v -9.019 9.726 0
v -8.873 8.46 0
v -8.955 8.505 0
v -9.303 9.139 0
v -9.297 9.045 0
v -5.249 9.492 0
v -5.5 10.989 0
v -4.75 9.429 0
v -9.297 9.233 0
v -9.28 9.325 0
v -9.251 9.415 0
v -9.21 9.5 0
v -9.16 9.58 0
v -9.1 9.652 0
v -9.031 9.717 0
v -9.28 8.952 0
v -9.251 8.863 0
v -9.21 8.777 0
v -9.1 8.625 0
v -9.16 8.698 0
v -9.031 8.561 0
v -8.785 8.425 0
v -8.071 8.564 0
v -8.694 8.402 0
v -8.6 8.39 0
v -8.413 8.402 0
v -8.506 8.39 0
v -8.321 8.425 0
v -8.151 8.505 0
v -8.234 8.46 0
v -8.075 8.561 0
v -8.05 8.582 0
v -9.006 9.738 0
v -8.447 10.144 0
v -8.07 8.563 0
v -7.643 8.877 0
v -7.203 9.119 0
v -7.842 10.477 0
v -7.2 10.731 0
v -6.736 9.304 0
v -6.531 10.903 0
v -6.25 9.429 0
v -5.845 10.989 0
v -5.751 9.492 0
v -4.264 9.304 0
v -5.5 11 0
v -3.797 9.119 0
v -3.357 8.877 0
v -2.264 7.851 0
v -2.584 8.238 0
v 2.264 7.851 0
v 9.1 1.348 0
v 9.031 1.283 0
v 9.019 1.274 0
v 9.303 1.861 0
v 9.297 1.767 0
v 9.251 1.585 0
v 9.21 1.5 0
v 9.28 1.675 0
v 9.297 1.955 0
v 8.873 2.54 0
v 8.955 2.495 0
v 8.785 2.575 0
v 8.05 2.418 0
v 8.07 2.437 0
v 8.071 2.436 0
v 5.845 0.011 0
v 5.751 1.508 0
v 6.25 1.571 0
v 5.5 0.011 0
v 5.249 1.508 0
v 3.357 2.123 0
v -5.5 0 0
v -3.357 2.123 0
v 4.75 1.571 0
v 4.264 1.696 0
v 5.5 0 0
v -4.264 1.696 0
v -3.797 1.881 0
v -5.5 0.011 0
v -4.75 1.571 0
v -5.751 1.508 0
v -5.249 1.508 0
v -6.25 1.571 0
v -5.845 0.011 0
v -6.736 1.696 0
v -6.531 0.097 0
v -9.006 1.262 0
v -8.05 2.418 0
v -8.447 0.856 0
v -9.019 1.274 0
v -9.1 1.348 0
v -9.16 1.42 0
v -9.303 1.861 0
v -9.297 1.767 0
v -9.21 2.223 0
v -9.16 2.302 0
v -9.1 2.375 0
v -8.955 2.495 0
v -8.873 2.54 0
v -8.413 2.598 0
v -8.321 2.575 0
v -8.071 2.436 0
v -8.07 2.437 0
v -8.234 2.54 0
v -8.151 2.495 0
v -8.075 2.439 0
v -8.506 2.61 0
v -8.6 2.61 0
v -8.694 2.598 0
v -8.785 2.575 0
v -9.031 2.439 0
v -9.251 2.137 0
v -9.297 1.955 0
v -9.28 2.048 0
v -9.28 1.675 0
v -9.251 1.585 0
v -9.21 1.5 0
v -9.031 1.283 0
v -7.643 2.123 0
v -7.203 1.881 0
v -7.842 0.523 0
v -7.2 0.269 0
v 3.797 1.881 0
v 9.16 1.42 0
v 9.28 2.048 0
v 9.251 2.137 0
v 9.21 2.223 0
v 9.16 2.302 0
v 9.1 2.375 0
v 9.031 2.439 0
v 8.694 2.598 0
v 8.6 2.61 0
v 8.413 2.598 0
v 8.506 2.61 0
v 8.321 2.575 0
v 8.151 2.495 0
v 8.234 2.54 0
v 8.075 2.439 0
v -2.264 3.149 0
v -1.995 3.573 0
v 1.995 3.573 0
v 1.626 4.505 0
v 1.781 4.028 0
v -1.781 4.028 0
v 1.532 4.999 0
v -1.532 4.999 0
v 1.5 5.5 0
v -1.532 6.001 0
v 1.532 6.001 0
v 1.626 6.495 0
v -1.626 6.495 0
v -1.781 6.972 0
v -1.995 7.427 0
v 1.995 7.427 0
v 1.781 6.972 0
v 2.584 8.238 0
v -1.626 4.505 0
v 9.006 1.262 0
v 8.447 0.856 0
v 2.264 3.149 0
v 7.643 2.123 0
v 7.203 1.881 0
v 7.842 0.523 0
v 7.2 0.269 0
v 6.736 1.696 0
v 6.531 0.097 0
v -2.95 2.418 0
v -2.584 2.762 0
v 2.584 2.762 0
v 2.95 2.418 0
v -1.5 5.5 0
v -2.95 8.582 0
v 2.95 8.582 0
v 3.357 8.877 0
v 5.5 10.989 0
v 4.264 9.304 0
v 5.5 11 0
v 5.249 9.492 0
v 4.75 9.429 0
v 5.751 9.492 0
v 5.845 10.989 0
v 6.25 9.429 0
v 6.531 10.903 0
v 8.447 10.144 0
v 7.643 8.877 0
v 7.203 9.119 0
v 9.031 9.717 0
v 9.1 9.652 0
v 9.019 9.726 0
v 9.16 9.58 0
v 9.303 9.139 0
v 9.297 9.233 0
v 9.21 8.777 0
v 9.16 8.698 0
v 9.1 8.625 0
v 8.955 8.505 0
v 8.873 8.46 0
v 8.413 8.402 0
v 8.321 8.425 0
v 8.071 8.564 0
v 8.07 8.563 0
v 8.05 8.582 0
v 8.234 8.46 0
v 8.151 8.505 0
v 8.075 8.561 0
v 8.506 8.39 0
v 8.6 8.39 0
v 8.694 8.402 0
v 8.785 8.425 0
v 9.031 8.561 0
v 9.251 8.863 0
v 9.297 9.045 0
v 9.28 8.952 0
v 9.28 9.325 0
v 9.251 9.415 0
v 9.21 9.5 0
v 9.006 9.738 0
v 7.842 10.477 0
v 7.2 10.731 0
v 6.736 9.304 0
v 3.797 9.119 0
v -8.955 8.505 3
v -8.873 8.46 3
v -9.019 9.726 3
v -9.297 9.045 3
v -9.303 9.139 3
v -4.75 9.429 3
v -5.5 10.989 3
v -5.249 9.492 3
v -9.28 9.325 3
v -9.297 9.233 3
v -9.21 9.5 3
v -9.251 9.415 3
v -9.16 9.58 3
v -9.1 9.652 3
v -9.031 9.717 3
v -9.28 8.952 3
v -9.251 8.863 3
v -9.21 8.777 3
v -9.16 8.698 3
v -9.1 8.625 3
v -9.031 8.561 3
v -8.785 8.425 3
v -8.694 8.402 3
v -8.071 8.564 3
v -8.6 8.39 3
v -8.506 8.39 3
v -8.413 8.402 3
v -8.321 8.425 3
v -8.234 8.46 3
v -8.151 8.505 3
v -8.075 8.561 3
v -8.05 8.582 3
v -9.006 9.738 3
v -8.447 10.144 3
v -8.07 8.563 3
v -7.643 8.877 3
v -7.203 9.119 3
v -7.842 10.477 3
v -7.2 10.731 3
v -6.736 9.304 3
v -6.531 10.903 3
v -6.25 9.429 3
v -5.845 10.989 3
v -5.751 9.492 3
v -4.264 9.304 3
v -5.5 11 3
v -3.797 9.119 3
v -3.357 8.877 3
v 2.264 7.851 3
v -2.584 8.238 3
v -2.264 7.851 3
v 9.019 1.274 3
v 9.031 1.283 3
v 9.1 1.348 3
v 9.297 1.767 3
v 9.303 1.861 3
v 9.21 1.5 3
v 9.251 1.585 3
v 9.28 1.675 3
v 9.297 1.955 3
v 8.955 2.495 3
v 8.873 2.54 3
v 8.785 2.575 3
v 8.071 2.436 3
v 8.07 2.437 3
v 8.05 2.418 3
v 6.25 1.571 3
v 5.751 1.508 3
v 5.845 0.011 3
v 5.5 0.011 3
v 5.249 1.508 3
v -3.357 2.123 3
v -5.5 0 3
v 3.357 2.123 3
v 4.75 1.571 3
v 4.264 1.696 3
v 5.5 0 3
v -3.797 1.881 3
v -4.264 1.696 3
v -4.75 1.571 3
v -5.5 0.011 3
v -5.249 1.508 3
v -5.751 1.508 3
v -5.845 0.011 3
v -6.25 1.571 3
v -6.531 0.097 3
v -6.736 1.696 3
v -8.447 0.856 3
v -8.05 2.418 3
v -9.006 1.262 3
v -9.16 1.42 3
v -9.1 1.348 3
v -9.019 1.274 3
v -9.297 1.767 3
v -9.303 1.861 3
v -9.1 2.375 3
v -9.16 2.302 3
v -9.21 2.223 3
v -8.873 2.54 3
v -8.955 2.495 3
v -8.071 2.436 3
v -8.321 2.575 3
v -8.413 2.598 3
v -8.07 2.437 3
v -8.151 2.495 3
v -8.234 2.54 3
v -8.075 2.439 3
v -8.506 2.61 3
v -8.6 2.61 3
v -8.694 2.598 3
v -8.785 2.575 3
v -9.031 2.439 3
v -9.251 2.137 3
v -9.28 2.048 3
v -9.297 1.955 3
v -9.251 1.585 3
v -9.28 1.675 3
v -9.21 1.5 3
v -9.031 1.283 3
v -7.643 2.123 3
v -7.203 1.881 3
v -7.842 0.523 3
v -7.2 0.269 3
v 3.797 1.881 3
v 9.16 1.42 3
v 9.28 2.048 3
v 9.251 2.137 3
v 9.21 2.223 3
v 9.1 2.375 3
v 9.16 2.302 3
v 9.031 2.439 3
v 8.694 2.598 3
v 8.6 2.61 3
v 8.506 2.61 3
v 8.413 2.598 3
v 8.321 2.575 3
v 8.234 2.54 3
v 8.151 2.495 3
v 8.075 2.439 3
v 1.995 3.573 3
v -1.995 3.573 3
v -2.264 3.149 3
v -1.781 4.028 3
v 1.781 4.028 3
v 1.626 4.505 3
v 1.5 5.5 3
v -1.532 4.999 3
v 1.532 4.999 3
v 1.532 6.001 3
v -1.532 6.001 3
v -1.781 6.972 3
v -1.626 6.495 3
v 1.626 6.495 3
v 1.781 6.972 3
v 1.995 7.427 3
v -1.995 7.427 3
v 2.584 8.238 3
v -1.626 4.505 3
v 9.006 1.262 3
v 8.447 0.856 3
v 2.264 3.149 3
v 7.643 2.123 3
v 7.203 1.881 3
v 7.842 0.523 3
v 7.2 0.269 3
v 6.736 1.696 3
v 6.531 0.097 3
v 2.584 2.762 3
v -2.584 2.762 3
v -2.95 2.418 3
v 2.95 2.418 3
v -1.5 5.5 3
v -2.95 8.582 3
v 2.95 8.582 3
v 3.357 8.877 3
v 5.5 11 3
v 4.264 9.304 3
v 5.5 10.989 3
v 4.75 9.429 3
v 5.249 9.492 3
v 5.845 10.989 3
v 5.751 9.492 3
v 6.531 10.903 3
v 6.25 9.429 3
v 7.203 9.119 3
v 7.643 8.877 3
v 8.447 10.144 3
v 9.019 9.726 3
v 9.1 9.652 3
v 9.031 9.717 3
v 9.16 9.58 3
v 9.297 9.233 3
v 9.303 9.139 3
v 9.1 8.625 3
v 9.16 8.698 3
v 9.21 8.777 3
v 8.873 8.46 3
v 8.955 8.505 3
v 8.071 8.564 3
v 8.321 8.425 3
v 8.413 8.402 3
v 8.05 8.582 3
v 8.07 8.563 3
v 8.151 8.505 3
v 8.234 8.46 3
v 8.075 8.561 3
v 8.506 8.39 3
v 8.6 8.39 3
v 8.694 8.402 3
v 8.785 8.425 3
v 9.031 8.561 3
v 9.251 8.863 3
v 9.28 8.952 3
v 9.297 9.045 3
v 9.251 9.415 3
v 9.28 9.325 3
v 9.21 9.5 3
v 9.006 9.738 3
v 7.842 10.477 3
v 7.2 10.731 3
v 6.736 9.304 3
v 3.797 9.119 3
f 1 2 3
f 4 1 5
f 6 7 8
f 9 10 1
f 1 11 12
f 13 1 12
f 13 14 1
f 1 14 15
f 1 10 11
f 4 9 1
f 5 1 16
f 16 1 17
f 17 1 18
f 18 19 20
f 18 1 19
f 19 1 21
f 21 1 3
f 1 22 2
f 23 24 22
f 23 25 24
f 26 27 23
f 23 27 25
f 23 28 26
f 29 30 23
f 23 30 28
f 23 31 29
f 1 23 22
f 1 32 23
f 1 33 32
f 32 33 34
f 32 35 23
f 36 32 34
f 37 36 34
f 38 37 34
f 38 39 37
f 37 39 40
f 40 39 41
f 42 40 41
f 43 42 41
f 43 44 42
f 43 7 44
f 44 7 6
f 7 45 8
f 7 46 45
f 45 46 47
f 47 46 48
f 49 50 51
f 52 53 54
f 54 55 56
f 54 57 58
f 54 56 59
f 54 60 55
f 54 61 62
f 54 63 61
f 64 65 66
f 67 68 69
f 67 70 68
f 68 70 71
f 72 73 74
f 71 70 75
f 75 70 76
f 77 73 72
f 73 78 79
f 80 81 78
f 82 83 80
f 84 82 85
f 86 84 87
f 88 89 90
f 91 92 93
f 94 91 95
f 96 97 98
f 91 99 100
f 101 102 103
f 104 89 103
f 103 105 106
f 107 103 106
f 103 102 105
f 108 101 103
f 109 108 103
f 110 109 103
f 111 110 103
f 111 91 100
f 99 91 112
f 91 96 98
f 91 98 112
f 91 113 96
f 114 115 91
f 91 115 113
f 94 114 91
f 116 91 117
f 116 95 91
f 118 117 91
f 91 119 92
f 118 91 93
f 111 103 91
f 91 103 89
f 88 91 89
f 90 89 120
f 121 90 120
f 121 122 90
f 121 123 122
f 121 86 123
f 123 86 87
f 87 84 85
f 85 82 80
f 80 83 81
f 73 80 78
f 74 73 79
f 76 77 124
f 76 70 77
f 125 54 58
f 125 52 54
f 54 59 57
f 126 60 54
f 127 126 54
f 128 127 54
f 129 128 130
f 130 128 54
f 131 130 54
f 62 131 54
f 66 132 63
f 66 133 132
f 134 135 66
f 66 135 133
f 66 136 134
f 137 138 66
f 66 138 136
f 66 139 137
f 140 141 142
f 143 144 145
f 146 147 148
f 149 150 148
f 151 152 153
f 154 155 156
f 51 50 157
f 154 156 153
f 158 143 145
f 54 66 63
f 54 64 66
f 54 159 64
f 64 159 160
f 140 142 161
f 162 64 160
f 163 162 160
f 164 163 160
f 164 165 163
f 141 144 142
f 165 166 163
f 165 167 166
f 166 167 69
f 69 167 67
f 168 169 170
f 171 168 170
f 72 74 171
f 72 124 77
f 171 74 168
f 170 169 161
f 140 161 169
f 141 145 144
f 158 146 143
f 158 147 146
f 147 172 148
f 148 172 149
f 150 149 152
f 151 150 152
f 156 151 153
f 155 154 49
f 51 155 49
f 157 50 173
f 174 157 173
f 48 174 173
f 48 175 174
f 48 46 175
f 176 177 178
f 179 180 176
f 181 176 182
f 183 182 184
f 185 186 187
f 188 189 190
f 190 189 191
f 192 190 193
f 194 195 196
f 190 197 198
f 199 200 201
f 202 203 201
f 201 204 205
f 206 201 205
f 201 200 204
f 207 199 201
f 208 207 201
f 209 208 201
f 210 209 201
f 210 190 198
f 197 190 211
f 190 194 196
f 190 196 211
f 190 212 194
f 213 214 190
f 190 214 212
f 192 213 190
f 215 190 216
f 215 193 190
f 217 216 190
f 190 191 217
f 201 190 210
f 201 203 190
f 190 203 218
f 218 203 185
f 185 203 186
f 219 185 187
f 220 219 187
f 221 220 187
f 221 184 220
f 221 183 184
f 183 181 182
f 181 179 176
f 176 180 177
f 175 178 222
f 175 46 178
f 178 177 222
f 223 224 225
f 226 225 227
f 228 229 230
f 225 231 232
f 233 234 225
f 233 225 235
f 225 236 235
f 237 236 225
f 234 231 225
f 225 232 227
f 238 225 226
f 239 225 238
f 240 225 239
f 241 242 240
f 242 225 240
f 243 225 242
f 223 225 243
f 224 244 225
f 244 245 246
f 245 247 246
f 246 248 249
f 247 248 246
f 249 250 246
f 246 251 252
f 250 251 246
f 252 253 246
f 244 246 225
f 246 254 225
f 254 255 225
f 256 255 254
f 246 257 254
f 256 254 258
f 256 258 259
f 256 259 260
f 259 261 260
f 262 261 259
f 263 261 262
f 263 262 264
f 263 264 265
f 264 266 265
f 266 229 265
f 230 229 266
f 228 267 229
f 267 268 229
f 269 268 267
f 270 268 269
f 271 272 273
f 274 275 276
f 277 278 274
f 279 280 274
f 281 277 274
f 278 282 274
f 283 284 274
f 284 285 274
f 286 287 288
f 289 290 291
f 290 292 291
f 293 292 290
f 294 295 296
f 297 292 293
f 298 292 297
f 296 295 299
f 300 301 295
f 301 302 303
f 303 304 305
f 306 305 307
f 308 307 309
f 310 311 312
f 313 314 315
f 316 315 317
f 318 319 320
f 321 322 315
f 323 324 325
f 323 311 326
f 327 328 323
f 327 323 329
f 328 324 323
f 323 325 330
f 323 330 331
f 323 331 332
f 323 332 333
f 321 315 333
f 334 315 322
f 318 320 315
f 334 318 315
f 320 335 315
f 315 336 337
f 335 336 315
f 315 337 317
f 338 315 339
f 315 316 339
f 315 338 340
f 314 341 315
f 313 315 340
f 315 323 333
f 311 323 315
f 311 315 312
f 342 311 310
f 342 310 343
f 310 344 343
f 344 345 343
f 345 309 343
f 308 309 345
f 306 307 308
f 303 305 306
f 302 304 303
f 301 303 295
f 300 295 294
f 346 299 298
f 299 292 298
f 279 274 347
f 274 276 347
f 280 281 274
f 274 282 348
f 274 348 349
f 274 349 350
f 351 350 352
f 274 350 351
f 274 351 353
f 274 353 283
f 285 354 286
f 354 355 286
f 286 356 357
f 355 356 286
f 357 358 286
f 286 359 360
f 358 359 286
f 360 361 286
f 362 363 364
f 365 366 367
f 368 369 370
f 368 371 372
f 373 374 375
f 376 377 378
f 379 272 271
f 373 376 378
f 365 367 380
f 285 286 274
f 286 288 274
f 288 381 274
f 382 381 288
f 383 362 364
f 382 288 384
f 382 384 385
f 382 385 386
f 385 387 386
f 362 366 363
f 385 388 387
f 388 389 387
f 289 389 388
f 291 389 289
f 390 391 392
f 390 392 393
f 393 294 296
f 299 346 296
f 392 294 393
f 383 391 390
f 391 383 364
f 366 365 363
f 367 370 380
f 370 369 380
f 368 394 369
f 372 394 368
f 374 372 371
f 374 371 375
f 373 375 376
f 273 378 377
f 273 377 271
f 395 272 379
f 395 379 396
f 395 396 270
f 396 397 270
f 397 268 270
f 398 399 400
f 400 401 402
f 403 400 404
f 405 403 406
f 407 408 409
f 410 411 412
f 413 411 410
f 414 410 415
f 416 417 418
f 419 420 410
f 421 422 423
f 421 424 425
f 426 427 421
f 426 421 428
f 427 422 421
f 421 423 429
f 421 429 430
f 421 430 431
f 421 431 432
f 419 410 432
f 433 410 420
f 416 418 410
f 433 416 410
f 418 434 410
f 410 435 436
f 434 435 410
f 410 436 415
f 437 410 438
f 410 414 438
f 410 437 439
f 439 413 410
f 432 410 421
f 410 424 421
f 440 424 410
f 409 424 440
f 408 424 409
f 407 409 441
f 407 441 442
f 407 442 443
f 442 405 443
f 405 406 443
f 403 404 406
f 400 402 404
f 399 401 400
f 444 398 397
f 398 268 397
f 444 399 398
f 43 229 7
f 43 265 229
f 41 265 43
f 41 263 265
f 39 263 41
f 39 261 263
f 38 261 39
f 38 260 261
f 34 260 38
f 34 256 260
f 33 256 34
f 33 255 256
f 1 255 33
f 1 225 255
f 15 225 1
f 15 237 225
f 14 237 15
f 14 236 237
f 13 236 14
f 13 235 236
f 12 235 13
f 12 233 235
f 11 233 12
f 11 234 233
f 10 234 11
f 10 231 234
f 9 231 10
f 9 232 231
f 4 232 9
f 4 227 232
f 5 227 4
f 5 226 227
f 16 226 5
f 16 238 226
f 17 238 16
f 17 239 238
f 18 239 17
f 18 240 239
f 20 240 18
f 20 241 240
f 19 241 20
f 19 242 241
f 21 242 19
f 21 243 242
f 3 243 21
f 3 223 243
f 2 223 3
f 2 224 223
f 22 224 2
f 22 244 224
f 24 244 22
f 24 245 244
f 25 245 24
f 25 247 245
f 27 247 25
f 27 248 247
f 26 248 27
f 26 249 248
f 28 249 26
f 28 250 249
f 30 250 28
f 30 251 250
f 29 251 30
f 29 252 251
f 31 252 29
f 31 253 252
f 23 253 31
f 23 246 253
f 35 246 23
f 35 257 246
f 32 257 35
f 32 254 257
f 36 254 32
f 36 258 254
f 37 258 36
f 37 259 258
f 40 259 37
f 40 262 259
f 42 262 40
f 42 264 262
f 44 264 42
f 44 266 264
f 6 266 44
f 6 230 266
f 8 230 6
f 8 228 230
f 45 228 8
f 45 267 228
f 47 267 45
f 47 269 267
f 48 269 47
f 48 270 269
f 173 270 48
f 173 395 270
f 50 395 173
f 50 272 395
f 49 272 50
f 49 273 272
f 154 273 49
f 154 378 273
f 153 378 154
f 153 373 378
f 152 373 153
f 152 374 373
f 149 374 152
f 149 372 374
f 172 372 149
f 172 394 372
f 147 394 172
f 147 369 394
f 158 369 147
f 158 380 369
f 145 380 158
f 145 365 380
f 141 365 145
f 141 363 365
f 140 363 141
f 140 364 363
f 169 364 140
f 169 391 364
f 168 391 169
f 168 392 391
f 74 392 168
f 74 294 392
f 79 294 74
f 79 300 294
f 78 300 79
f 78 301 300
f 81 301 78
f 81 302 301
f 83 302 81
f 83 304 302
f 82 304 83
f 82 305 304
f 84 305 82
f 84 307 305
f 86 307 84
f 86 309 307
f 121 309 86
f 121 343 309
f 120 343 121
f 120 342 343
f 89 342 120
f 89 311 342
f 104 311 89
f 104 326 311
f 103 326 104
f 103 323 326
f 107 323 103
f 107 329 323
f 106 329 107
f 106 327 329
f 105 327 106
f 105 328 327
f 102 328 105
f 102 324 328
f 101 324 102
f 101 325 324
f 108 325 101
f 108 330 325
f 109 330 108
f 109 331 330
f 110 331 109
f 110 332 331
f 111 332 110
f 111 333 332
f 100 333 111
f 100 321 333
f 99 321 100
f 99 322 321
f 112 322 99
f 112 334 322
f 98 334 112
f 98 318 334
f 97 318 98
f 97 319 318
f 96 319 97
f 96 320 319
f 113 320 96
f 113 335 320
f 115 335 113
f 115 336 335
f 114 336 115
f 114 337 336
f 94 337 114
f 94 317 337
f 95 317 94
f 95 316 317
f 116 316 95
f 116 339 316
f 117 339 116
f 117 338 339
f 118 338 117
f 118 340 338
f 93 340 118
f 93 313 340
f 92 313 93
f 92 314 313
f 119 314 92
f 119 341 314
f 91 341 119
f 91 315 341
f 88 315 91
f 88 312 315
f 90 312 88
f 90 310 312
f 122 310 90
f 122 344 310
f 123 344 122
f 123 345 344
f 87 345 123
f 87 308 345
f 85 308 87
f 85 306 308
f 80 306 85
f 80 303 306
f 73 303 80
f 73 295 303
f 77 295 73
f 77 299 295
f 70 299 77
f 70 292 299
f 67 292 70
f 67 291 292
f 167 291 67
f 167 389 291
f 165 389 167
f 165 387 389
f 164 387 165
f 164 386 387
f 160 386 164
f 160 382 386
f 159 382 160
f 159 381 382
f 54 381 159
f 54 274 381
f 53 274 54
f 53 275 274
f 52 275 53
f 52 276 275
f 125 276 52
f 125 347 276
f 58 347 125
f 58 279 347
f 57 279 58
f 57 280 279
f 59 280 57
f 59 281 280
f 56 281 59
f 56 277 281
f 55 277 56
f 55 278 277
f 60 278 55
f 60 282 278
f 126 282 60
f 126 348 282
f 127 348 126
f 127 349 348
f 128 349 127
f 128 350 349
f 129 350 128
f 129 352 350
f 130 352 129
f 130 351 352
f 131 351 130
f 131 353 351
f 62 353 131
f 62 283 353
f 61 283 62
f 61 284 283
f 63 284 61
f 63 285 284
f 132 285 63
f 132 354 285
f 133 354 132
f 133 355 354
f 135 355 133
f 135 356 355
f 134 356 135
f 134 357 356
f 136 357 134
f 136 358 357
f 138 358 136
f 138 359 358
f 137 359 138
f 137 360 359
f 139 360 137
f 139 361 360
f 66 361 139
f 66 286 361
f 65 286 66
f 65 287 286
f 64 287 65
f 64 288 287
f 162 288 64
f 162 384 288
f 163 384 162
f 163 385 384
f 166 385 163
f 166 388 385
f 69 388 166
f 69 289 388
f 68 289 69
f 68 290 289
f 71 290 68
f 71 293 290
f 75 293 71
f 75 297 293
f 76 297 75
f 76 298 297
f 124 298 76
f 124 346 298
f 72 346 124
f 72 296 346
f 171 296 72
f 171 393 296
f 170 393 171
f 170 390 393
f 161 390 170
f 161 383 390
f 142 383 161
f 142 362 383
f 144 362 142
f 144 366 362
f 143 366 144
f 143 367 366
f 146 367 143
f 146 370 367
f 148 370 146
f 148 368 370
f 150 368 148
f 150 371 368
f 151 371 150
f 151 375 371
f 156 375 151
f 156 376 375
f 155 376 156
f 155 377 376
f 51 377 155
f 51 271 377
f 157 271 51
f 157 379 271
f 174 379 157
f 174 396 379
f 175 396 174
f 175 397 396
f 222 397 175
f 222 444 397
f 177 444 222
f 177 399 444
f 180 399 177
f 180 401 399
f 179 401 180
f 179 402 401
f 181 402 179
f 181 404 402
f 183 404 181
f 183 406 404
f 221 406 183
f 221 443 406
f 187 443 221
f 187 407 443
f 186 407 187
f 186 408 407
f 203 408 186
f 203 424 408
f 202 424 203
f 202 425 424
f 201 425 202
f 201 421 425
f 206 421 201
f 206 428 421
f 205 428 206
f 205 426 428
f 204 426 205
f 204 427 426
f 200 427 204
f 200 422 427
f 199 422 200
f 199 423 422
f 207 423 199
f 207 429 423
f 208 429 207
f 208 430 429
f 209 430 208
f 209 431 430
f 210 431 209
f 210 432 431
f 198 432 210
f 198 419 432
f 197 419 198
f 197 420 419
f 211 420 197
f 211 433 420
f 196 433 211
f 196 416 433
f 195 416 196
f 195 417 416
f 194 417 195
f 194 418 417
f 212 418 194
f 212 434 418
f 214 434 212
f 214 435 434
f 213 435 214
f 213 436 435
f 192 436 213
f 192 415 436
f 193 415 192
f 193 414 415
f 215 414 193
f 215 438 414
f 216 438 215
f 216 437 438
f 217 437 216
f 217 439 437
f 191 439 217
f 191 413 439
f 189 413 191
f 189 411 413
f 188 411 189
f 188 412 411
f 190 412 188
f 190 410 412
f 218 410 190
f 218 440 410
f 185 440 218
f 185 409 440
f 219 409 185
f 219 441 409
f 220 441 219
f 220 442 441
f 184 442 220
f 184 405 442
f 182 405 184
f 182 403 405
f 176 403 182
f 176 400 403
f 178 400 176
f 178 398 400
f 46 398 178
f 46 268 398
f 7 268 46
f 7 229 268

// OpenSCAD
// Copyright (c) 2016 Kenneth Johansson <ken@kenjo.org>
// License: BSD

// cable diameter
cable = 8;
// number of cable pairs for holder
rows = 1;
// wall thikness */
thik  = 1.5;
// size of opening for cable
angel = 50; // [90]

/*******************************************************************************/
/* [Hidden] */
$fn=50;

outer = cable + 2*thik;
clips(rows);

/* rows of dual clips */
module clips(num) {
    linear_extrude(height=3) {
	for(idx=[0 : 1 : num-1  ]) {
	    translate([0, outer * idx])
	    dual();
	}
    }
}

/* dual clip, centred */
module dual() {
    copy_mirror()
    translate([outer/2, outer/2])
    clip(cable, outer, angel);
}

/* single clip, centered */
module clip(cable, outer, angel) {
    difference() {
	union() {
	    /* fill in the middle */
	    translate([-outer/2,0])
	    square(outer/2);
	    translate([-outer/2,-outer/2])
	    square(outer/2);

	    /* outer circle */
	    circle(d=outer);
	}
	/* remove cable circle */
	circle(d=cable);
	polygon(points=[[0,0],[ outer/2, tan(angel)*outer/2],[outer/2,-tan(angel)*outer/2]]);
    }
    /* Add rouded edge */
    hyp = ((outer-cable)/2 + cable)/2;

    translate([ cos(angel)*hyp , sin(angel)*hyp])
    circle(d=(outer-cable)/2);
    translate([ cos(angel)*hyp , -sin(angel)*hyp])
    circle(d=(outer-cable)/2);
}


/******************************************************************************/
/* generic helpers */

module copy_mirror(vec=[1,0,0]) {
    children();
    mirror(vec) children();
}
